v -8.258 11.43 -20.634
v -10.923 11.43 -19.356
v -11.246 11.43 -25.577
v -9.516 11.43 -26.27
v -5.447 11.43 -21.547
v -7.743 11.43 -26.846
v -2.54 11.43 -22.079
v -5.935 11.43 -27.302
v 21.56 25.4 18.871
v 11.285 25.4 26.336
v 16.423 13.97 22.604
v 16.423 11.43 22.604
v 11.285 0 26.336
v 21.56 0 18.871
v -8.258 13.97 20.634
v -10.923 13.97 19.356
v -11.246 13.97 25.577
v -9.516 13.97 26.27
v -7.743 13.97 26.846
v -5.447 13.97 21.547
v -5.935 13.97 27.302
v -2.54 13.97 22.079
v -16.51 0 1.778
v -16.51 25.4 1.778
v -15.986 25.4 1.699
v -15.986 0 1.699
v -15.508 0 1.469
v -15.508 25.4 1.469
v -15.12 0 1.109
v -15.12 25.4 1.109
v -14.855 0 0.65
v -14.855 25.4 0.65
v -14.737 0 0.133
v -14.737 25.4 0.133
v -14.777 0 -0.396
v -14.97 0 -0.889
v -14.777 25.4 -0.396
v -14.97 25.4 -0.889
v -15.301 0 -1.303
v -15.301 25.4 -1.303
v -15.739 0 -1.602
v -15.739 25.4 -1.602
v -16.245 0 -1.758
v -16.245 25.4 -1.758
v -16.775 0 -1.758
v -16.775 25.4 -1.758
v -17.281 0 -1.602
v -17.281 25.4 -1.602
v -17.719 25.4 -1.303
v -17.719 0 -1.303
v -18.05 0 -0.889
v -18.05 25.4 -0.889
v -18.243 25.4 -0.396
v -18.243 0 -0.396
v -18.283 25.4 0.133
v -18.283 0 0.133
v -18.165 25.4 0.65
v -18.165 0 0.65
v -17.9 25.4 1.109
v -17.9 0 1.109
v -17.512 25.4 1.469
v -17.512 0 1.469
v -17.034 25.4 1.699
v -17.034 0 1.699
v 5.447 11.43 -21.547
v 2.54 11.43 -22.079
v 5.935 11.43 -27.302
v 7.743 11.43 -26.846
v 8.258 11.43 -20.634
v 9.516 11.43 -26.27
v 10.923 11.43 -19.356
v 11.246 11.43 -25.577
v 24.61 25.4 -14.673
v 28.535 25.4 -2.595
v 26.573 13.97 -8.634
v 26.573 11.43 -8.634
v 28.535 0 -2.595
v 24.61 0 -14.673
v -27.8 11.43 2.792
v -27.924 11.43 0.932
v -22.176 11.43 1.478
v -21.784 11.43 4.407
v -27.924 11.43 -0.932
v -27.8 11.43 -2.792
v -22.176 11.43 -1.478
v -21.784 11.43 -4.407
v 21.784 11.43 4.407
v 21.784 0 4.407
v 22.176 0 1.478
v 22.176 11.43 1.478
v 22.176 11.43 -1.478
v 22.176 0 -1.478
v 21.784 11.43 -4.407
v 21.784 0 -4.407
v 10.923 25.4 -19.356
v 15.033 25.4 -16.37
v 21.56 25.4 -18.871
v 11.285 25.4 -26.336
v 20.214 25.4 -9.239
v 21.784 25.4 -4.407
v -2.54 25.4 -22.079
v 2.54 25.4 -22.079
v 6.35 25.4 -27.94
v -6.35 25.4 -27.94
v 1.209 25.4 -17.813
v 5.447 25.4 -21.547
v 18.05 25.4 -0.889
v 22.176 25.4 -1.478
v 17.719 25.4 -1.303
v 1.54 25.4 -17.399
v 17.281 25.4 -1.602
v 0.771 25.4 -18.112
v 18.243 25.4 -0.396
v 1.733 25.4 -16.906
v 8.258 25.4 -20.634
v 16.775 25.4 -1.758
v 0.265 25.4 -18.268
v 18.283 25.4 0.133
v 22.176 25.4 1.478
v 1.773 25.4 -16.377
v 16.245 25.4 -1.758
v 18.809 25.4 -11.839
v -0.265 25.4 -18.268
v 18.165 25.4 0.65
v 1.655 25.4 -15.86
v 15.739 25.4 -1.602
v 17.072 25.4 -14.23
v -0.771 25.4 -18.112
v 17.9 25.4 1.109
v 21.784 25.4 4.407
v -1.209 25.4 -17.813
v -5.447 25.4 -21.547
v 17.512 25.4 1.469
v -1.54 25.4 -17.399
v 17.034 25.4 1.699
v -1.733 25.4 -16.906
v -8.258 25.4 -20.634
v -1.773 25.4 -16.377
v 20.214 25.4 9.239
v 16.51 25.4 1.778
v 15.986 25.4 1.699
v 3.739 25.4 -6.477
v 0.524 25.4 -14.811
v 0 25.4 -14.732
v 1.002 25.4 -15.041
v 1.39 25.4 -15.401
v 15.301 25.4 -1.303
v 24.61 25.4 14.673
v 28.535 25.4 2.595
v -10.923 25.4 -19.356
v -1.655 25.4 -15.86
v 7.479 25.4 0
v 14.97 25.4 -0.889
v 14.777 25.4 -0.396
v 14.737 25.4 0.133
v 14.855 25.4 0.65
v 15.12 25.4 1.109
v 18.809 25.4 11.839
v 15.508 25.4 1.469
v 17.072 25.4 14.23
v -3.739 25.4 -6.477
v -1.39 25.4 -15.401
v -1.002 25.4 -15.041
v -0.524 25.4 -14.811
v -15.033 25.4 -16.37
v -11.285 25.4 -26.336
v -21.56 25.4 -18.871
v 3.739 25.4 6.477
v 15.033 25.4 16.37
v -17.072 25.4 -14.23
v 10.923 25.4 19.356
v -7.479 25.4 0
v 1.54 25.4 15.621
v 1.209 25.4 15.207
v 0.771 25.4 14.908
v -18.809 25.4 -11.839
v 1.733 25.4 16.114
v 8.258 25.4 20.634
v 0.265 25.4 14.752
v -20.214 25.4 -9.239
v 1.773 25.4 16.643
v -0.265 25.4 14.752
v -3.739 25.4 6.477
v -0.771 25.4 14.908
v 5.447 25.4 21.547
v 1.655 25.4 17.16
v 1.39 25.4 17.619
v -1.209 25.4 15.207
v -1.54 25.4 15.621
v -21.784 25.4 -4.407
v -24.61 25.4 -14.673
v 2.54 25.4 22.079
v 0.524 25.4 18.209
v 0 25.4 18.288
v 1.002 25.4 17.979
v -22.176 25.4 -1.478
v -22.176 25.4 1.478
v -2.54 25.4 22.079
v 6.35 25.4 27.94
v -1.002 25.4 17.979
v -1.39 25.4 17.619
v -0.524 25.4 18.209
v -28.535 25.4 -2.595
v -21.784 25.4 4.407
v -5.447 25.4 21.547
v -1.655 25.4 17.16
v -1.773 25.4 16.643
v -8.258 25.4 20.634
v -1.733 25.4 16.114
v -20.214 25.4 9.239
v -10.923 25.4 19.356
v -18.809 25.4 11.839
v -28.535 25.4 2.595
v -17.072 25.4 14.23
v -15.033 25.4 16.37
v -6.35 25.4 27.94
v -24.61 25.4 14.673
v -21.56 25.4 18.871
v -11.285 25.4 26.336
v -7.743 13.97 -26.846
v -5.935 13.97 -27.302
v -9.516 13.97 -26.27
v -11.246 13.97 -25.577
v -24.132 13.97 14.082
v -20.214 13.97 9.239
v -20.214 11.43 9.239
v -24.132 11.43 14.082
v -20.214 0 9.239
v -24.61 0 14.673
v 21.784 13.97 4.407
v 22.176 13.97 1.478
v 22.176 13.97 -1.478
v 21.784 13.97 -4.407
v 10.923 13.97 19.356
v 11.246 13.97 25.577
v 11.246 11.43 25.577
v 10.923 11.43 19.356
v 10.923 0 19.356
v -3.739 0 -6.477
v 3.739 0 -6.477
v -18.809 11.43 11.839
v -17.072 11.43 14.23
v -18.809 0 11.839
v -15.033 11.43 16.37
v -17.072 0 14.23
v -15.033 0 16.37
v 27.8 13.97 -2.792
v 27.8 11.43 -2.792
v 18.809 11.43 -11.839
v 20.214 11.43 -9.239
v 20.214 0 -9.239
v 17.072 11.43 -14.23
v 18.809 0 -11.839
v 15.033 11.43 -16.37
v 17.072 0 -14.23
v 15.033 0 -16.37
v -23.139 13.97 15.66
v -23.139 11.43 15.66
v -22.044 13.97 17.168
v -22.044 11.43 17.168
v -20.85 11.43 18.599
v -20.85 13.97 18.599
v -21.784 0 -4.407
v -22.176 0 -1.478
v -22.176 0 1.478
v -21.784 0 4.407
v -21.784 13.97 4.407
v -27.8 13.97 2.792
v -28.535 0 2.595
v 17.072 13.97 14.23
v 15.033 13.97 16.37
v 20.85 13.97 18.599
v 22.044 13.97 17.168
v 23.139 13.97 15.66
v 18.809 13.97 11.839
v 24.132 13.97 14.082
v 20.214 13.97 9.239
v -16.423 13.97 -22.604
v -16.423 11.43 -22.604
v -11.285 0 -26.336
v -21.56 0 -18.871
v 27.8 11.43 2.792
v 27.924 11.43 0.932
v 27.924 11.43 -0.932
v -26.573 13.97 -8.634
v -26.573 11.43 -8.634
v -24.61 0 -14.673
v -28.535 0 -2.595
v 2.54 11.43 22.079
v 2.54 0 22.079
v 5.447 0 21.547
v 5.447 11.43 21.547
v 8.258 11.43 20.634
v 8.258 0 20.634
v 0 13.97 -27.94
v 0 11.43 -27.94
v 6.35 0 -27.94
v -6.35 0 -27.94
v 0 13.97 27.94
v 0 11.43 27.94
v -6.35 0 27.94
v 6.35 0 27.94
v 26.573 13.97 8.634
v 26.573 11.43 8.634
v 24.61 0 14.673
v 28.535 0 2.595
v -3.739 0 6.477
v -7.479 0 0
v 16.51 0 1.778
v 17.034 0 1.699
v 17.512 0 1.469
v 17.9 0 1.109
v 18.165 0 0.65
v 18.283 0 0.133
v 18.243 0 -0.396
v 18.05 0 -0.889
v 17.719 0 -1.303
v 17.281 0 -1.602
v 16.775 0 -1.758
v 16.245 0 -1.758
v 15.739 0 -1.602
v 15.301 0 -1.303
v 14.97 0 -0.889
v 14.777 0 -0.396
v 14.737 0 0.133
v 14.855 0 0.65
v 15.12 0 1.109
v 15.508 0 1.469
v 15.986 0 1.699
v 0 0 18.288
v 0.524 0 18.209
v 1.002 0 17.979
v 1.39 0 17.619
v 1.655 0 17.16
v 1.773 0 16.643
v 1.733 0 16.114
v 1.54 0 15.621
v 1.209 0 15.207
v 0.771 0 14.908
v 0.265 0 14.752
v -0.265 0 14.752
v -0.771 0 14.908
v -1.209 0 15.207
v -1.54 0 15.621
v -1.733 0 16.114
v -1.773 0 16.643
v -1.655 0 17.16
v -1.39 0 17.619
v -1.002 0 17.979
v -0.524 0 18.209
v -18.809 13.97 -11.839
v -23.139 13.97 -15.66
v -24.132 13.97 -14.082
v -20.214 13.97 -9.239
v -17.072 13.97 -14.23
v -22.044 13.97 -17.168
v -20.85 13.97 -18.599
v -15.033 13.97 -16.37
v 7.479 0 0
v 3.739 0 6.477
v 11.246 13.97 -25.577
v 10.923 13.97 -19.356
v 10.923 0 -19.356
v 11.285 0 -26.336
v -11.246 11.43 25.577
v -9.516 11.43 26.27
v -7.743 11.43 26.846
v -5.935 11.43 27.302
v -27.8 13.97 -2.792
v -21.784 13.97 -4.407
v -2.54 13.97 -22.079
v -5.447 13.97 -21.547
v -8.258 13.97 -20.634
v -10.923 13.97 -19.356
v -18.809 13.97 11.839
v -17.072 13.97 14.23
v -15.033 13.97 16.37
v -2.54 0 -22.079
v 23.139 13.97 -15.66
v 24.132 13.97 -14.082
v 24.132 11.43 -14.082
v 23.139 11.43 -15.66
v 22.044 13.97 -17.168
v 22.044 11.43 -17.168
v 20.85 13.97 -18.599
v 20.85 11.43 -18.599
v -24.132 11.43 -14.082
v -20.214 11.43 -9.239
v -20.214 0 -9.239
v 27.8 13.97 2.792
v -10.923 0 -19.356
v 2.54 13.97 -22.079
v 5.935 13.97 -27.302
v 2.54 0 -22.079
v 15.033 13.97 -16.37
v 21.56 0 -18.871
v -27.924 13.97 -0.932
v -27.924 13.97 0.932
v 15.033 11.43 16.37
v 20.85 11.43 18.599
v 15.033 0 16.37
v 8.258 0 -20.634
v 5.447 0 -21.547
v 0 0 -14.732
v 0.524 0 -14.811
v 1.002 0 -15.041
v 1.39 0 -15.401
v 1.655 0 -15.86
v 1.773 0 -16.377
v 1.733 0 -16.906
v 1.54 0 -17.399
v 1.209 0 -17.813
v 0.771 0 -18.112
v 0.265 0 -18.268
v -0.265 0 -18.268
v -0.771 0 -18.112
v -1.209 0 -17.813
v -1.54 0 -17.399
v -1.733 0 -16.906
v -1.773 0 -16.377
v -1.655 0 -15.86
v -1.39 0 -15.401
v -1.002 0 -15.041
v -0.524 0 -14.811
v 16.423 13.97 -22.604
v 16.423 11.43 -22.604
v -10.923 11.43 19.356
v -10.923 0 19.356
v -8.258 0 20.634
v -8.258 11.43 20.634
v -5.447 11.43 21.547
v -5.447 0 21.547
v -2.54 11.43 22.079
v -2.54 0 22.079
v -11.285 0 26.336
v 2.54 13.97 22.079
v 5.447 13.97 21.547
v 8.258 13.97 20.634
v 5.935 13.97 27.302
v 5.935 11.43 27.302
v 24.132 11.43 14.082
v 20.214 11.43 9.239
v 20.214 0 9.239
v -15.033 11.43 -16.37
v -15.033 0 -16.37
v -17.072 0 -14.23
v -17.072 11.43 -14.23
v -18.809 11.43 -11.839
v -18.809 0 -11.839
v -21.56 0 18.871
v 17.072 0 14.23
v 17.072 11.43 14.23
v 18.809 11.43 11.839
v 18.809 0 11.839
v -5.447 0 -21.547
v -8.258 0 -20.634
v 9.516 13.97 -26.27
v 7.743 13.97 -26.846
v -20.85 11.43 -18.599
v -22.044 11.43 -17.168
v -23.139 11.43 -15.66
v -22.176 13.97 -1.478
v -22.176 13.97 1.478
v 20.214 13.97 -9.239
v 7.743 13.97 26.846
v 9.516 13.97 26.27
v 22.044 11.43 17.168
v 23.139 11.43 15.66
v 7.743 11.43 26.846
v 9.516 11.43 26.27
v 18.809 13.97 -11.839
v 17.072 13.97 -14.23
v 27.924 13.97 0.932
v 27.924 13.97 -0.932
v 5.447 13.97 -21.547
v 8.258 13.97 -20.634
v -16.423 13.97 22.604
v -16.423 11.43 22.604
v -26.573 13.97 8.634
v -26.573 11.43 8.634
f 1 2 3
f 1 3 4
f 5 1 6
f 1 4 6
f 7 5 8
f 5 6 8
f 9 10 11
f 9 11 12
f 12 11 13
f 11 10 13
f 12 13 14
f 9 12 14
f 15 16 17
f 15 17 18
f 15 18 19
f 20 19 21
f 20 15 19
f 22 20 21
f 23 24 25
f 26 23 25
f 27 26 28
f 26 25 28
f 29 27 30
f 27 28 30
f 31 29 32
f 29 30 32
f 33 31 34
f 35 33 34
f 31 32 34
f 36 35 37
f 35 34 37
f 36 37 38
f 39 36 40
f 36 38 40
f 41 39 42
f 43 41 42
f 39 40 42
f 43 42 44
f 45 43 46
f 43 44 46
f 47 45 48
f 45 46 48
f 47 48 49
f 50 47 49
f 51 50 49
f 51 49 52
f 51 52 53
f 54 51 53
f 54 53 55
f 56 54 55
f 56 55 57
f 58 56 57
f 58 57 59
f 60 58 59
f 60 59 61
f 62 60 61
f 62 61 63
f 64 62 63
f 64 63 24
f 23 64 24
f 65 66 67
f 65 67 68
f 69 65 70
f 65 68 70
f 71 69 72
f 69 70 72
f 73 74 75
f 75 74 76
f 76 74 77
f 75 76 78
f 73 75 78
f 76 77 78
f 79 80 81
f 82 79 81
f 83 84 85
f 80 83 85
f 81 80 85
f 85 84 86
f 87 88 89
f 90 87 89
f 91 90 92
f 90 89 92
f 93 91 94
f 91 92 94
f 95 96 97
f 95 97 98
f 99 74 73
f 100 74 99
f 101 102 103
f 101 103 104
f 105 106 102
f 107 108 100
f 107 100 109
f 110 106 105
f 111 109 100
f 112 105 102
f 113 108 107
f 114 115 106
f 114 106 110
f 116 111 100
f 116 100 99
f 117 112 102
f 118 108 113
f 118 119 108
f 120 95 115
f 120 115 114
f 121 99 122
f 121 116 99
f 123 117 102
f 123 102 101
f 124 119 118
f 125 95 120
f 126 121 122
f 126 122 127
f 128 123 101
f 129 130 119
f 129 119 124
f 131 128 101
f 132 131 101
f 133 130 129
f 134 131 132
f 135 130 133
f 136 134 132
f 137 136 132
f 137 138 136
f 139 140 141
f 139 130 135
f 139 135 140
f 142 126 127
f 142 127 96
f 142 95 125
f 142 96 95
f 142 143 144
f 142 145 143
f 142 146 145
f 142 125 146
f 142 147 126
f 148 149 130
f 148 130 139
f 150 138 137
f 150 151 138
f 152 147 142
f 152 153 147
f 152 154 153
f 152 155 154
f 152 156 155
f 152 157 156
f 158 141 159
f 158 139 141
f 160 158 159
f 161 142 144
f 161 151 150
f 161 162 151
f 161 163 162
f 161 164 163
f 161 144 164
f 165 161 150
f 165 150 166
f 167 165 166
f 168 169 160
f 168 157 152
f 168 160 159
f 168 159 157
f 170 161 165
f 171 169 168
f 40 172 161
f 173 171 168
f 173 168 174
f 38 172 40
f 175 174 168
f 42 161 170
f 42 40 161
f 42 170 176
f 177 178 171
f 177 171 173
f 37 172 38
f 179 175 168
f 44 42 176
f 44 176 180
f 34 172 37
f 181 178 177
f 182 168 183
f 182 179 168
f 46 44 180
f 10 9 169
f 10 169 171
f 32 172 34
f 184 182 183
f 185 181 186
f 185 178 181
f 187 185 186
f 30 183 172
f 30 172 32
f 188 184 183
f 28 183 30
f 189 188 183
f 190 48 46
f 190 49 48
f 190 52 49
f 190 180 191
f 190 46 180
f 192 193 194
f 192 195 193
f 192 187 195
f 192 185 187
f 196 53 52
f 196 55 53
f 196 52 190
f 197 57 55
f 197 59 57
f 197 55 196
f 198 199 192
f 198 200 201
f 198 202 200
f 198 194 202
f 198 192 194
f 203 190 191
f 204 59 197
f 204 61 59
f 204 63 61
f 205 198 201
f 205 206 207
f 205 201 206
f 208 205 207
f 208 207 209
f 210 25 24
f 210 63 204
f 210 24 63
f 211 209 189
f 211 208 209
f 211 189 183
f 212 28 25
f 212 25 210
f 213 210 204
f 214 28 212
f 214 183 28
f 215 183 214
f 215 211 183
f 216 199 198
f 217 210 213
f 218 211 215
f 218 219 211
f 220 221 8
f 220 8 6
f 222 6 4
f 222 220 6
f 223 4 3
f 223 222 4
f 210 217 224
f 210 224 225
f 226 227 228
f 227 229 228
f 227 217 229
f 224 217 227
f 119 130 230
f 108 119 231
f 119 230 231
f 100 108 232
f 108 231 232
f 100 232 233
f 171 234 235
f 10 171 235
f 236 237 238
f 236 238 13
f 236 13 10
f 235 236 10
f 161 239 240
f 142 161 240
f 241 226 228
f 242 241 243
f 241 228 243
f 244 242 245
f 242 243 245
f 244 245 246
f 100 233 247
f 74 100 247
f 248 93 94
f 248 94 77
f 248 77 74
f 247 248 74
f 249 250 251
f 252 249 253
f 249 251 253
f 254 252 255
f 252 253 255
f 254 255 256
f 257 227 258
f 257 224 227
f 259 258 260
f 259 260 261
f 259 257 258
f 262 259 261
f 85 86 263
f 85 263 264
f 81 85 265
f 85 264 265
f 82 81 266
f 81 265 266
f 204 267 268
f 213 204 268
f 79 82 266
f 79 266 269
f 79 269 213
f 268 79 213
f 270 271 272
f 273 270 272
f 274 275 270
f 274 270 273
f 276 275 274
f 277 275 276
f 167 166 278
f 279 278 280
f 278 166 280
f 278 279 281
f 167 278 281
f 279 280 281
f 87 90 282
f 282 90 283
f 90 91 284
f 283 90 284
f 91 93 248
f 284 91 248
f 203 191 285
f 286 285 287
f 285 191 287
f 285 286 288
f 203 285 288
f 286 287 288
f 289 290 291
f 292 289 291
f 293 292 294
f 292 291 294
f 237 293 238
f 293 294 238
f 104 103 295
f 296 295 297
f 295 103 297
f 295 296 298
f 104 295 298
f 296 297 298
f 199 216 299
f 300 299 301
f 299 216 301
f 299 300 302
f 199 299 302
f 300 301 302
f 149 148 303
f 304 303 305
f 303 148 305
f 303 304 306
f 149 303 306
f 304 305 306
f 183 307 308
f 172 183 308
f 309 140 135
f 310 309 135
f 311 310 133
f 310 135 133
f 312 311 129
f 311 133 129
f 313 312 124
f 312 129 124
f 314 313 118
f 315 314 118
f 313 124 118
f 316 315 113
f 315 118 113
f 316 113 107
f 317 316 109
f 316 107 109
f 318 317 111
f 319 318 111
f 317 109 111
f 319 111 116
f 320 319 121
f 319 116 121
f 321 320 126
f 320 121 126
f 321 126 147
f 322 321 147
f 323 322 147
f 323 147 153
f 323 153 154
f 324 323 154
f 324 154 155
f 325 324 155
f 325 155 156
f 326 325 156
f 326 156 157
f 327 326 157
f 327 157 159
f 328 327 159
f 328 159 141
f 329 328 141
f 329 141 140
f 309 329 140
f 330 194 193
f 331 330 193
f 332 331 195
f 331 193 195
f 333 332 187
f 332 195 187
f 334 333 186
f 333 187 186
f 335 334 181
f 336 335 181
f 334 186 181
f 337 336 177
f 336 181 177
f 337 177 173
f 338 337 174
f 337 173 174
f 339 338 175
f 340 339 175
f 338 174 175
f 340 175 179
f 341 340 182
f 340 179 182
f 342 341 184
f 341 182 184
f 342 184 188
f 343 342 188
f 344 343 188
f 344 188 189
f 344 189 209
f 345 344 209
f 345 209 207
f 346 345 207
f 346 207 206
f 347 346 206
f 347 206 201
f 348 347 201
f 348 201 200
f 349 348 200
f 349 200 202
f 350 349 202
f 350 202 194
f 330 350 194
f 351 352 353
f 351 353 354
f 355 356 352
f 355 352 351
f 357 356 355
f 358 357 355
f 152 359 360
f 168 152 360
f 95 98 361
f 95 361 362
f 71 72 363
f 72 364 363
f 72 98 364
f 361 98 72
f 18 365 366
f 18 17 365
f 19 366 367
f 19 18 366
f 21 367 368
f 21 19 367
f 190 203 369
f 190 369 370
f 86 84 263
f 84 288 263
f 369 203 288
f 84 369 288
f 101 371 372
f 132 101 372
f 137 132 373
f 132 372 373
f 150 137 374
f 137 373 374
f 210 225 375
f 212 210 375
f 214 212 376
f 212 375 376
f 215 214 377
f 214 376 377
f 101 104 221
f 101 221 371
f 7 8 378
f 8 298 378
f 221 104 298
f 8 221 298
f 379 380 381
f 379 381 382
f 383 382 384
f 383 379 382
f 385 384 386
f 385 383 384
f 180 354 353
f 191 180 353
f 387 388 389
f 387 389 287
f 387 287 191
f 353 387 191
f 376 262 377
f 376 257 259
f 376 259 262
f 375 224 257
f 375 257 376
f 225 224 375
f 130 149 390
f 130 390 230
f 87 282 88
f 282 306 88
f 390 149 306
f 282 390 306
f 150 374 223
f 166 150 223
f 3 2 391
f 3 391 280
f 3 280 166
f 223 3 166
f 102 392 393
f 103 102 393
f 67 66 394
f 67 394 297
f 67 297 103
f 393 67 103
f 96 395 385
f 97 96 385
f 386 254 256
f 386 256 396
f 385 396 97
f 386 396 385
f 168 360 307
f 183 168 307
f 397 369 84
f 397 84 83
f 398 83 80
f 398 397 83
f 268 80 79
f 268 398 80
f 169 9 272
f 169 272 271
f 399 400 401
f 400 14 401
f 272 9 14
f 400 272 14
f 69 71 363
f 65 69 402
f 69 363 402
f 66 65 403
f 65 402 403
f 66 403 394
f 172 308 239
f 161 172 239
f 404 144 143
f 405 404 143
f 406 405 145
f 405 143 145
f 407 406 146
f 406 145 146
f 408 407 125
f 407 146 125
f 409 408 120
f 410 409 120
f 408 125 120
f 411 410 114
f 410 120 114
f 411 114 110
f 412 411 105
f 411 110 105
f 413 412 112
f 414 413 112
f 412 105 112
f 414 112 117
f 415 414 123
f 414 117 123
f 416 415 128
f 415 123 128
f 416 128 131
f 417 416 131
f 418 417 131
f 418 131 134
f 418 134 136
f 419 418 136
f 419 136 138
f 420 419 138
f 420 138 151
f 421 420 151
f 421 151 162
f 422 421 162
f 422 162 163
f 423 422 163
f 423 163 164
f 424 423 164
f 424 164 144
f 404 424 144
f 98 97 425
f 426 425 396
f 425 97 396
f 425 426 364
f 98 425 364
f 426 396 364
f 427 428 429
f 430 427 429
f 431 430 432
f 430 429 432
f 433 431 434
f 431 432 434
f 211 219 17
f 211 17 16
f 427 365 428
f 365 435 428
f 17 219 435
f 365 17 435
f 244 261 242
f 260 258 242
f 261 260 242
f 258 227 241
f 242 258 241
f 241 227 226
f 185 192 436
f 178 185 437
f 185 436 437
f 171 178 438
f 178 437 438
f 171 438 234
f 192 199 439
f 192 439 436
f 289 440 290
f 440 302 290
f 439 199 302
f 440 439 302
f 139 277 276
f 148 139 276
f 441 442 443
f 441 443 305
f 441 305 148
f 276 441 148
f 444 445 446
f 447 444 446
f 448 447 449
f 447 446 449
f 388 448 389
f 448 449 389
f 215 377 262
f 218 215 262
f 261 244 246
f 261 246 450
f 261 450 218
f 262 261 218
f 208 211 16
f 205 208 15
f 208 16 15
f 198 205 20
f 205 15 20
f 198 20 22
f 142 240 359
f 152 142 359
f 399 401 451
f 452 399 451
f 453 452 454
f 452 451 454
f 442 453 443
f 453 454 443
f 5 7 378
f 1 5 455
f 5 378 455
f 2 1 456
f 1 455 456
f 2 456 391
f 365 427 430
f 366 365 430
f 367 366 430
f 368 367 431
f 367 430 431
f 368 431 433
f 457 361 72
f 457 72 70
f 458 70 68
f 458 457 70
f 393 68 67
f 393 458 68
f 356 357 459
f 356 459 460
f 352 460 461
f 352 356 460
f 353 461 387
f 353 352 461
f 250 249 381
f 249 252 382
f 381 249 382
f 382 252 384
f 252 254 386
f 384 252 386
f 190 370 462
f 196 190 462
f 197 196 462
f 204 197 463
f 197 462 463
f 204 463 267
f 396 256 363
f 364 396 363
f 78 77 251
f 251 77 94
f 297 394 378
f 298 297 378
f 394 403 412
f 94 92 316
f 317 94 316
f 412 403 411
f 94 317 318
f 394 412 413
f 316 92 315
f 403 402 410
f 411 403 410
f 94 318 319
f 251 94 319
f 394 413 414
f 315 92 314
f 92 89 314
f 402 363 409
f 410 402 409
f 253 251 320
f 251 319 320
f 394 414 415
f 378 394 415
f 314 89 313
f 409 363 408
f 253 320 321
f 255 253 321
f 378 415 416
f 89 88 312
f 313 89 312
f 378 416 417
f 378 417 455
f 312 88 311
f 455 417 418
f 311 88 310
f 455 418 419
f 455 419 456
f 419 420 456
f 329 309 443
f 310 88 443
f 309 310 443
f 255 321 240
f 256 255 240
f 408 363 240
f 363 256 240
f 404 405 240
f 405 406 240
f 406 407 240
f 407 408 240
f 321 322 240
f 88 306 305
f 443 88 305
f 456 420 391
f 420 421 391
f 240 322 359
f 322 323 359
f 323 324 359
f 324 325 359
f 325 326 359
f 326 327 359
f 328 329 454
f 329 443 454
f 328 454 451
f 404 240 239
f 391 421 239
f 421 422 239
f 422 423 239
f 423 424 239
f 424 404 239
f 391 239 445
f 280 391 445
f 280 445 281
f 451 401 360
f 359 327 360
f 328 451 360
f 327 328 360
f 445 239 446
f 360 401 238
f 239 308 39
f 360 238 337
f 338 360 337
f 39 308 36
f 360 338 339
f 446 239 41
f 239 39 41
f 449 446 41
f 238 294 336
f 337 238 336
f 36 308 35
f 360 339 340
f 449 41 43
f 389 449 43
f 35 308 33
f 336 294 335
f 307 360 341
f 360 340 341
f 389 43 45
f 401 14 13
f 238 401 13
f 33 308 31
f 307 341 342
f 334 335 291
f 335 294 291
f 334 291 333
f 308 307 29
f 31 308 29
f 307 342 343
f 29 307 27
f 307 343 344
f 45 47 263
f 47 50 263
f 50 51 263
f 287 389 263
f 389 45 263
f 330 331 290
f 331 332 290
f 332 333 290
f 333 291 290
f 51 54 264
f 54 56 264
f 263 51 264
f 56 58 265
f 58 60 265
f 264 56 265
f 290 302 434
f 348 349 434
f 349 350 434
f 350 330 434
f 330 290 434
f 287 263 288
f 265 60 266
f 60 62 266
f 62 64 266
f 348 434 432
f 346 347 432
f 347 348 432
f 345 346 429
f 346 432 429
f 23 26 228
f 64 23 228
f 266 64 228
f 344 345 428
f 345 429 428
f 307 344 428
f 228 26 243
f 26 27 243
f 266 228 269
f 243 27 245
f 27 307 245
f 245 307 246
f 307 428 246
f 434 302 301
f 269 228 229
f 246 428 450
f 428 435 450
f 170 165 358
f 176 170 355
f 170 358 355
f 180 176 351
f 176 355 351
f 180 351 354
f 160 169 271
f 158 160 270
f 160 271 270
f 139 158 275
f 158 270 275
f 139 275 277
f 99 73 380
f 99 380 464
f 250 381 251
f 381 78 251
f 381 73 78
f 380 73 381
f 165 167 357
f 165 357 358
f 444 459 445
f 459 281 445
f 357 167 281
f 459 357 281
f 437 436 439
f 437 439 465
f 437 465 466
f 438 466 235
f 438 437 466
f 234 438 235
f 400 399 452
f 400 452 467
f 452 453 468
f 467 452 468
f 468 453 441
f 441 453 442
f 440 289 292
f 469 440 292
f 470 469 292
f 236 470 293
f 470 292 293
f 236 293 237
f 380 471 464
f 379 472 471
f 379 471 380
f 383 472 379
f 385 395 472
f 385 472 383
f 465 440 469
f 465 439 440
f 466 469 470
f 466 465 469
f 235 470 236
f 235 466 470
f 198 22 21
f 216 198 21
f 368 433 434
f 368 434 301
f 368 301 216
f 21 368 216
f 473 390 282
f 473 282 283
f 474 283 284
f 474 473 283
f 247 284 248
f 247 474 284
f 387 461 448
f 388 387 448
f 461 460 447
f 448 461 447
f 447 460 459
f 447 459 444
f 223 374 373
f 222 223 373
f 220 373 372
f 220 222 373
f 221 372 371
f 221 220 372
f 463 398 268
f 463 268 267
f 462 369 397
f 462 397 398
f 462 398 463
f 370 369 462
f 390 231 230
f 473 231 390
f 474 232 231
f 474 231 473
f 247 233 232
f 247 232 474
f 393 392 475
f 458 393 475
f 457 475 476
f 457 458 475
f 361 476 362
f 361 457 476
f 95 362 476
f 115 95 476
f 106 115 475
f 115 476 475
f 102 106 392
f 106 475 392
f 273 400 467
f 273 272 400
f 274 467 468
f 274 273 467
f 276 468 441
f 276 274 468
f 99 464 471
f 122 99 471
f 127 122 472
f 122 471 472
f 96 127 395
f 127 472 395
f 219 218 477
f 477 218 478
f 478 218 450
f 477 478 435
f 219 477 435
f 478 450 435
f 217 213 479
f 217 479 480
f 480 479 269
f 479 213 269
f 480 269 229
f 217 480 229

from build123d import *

# Parameters (mm, degrees)
SKETCH1_R           = 22.225
BOSS_EXTRUDE1_DEPTH = 25.4
CUT_EXTRUDE1_DEPTH  = 41.411152545
BOSS_EXTRUDE2_DEPTH = 25.4
CIRPATTERN1_COUNT   = 10
SKETCH5_R           = 27.94
SKETCH5_R_2         = 22.225
BOSS_EXTRUDE3_DEPTH = 1.27
SKETCH6_R           = 1.778
CUT_EXTRUDE2_DEPTH  = 48.329030175


with BuildPart() as part:
    # Sketch1 → Boss-Extrude1 (new body)
    with BuildSketch(Plane(origin=(0, 0, 0), x_dir=(1, 0, 0), z_dir=(0, 1, 0))):
        with Locations(Location((0, 0, 0), (0, 0, 270))):
            Circle(SKETCH1_R)
    extrude(amount=BOSS_EXTRUDE1_DEPTH)

    # Sketch2 → Cut-Extrude1 (cut, through all)
    with BuildSketch(Plane.XZ):
        Polygon((7.478995387, 0), (3.739497694, 6.477), (-3.739497694, 6.477), (-7.478995387, 0), (-3.739497694, -6.477), (3.739497694, -6.477), align=None)
    extrude(amount=-CUT_EXTRUDE1_DEPTH, mode=Mode.SUBTRACT)

    # Sketch3 → Boss-Extrude2 (add)
    with BuildSketch(Plane.XZ):
        with BuildLine():
            Line((-2.54, 22.079380086), (-6.35, 27.94))
            Line((-6.35, 27.94), (6.35, 27.94))
            Line((6.35, 27.94), (2.54, 22.079380086))
            ThreePointArc((2.54, 22.079380086), (0, 22.225), (-2.54, 22.079380086))
        make_face()
    boss_extrude2 = extrude(amount=-BOSS_EXTRUDE2_DEPTH)

    # CirPattern1: Boss-Extrude2 ×10 about axis
    cirpattern1_axis = Axis((0, 0, 0), (0, 1, 0))
    for i in range(1, CIRPATTERN1_COUNT):
        add(boss_extrude2.rotate(cirpattern1_axis, i * 360 / CIRPATTERN1_COUNT))

    # Sketch5 → Boss-Extrude3 (add, symmetric)
    with BuildSketch(Plane(origin=(0, 12.7, 0), x_dir=(1, 0, 0), z_dir=(0, 1, 0))):
        Circle(SKETCH5_R)
        Circle(SKETCH5_R_2, mode=Mode.SUBTRACT)
    extrude(amount=BOSS_EXTRUDE3_DEPTH, both=True)

    # Sketch6 → Cut-Extrude2 (cut, through all)
    with BuildSketch(Plane(origin=(0, 25.4, 0), x_dir=(1, 0, 0), z_dir=(0, 1, 0))):
        with Locations(Location((-16.51, 0, 0), (0, 0, 270))):
            Circle(SKETCH6_R)
        with Locations(Location((0, 16.51, 0), (0, 0, 270))):
            Circle(SKETCH6_R)
        with Locations(Location((16.51, 0, 0), (0, 0, 270))):
            Circle(SKETCH6_R)
        with Locations(Location((0, -16.51, 0), (0, 0, 270))):
            Circle(SKETCH6_R)
    extrude(amount=-CUT_EXTRUDE2_DEPTH, mode=Mode.SUBTRACT)


solid = part.part
